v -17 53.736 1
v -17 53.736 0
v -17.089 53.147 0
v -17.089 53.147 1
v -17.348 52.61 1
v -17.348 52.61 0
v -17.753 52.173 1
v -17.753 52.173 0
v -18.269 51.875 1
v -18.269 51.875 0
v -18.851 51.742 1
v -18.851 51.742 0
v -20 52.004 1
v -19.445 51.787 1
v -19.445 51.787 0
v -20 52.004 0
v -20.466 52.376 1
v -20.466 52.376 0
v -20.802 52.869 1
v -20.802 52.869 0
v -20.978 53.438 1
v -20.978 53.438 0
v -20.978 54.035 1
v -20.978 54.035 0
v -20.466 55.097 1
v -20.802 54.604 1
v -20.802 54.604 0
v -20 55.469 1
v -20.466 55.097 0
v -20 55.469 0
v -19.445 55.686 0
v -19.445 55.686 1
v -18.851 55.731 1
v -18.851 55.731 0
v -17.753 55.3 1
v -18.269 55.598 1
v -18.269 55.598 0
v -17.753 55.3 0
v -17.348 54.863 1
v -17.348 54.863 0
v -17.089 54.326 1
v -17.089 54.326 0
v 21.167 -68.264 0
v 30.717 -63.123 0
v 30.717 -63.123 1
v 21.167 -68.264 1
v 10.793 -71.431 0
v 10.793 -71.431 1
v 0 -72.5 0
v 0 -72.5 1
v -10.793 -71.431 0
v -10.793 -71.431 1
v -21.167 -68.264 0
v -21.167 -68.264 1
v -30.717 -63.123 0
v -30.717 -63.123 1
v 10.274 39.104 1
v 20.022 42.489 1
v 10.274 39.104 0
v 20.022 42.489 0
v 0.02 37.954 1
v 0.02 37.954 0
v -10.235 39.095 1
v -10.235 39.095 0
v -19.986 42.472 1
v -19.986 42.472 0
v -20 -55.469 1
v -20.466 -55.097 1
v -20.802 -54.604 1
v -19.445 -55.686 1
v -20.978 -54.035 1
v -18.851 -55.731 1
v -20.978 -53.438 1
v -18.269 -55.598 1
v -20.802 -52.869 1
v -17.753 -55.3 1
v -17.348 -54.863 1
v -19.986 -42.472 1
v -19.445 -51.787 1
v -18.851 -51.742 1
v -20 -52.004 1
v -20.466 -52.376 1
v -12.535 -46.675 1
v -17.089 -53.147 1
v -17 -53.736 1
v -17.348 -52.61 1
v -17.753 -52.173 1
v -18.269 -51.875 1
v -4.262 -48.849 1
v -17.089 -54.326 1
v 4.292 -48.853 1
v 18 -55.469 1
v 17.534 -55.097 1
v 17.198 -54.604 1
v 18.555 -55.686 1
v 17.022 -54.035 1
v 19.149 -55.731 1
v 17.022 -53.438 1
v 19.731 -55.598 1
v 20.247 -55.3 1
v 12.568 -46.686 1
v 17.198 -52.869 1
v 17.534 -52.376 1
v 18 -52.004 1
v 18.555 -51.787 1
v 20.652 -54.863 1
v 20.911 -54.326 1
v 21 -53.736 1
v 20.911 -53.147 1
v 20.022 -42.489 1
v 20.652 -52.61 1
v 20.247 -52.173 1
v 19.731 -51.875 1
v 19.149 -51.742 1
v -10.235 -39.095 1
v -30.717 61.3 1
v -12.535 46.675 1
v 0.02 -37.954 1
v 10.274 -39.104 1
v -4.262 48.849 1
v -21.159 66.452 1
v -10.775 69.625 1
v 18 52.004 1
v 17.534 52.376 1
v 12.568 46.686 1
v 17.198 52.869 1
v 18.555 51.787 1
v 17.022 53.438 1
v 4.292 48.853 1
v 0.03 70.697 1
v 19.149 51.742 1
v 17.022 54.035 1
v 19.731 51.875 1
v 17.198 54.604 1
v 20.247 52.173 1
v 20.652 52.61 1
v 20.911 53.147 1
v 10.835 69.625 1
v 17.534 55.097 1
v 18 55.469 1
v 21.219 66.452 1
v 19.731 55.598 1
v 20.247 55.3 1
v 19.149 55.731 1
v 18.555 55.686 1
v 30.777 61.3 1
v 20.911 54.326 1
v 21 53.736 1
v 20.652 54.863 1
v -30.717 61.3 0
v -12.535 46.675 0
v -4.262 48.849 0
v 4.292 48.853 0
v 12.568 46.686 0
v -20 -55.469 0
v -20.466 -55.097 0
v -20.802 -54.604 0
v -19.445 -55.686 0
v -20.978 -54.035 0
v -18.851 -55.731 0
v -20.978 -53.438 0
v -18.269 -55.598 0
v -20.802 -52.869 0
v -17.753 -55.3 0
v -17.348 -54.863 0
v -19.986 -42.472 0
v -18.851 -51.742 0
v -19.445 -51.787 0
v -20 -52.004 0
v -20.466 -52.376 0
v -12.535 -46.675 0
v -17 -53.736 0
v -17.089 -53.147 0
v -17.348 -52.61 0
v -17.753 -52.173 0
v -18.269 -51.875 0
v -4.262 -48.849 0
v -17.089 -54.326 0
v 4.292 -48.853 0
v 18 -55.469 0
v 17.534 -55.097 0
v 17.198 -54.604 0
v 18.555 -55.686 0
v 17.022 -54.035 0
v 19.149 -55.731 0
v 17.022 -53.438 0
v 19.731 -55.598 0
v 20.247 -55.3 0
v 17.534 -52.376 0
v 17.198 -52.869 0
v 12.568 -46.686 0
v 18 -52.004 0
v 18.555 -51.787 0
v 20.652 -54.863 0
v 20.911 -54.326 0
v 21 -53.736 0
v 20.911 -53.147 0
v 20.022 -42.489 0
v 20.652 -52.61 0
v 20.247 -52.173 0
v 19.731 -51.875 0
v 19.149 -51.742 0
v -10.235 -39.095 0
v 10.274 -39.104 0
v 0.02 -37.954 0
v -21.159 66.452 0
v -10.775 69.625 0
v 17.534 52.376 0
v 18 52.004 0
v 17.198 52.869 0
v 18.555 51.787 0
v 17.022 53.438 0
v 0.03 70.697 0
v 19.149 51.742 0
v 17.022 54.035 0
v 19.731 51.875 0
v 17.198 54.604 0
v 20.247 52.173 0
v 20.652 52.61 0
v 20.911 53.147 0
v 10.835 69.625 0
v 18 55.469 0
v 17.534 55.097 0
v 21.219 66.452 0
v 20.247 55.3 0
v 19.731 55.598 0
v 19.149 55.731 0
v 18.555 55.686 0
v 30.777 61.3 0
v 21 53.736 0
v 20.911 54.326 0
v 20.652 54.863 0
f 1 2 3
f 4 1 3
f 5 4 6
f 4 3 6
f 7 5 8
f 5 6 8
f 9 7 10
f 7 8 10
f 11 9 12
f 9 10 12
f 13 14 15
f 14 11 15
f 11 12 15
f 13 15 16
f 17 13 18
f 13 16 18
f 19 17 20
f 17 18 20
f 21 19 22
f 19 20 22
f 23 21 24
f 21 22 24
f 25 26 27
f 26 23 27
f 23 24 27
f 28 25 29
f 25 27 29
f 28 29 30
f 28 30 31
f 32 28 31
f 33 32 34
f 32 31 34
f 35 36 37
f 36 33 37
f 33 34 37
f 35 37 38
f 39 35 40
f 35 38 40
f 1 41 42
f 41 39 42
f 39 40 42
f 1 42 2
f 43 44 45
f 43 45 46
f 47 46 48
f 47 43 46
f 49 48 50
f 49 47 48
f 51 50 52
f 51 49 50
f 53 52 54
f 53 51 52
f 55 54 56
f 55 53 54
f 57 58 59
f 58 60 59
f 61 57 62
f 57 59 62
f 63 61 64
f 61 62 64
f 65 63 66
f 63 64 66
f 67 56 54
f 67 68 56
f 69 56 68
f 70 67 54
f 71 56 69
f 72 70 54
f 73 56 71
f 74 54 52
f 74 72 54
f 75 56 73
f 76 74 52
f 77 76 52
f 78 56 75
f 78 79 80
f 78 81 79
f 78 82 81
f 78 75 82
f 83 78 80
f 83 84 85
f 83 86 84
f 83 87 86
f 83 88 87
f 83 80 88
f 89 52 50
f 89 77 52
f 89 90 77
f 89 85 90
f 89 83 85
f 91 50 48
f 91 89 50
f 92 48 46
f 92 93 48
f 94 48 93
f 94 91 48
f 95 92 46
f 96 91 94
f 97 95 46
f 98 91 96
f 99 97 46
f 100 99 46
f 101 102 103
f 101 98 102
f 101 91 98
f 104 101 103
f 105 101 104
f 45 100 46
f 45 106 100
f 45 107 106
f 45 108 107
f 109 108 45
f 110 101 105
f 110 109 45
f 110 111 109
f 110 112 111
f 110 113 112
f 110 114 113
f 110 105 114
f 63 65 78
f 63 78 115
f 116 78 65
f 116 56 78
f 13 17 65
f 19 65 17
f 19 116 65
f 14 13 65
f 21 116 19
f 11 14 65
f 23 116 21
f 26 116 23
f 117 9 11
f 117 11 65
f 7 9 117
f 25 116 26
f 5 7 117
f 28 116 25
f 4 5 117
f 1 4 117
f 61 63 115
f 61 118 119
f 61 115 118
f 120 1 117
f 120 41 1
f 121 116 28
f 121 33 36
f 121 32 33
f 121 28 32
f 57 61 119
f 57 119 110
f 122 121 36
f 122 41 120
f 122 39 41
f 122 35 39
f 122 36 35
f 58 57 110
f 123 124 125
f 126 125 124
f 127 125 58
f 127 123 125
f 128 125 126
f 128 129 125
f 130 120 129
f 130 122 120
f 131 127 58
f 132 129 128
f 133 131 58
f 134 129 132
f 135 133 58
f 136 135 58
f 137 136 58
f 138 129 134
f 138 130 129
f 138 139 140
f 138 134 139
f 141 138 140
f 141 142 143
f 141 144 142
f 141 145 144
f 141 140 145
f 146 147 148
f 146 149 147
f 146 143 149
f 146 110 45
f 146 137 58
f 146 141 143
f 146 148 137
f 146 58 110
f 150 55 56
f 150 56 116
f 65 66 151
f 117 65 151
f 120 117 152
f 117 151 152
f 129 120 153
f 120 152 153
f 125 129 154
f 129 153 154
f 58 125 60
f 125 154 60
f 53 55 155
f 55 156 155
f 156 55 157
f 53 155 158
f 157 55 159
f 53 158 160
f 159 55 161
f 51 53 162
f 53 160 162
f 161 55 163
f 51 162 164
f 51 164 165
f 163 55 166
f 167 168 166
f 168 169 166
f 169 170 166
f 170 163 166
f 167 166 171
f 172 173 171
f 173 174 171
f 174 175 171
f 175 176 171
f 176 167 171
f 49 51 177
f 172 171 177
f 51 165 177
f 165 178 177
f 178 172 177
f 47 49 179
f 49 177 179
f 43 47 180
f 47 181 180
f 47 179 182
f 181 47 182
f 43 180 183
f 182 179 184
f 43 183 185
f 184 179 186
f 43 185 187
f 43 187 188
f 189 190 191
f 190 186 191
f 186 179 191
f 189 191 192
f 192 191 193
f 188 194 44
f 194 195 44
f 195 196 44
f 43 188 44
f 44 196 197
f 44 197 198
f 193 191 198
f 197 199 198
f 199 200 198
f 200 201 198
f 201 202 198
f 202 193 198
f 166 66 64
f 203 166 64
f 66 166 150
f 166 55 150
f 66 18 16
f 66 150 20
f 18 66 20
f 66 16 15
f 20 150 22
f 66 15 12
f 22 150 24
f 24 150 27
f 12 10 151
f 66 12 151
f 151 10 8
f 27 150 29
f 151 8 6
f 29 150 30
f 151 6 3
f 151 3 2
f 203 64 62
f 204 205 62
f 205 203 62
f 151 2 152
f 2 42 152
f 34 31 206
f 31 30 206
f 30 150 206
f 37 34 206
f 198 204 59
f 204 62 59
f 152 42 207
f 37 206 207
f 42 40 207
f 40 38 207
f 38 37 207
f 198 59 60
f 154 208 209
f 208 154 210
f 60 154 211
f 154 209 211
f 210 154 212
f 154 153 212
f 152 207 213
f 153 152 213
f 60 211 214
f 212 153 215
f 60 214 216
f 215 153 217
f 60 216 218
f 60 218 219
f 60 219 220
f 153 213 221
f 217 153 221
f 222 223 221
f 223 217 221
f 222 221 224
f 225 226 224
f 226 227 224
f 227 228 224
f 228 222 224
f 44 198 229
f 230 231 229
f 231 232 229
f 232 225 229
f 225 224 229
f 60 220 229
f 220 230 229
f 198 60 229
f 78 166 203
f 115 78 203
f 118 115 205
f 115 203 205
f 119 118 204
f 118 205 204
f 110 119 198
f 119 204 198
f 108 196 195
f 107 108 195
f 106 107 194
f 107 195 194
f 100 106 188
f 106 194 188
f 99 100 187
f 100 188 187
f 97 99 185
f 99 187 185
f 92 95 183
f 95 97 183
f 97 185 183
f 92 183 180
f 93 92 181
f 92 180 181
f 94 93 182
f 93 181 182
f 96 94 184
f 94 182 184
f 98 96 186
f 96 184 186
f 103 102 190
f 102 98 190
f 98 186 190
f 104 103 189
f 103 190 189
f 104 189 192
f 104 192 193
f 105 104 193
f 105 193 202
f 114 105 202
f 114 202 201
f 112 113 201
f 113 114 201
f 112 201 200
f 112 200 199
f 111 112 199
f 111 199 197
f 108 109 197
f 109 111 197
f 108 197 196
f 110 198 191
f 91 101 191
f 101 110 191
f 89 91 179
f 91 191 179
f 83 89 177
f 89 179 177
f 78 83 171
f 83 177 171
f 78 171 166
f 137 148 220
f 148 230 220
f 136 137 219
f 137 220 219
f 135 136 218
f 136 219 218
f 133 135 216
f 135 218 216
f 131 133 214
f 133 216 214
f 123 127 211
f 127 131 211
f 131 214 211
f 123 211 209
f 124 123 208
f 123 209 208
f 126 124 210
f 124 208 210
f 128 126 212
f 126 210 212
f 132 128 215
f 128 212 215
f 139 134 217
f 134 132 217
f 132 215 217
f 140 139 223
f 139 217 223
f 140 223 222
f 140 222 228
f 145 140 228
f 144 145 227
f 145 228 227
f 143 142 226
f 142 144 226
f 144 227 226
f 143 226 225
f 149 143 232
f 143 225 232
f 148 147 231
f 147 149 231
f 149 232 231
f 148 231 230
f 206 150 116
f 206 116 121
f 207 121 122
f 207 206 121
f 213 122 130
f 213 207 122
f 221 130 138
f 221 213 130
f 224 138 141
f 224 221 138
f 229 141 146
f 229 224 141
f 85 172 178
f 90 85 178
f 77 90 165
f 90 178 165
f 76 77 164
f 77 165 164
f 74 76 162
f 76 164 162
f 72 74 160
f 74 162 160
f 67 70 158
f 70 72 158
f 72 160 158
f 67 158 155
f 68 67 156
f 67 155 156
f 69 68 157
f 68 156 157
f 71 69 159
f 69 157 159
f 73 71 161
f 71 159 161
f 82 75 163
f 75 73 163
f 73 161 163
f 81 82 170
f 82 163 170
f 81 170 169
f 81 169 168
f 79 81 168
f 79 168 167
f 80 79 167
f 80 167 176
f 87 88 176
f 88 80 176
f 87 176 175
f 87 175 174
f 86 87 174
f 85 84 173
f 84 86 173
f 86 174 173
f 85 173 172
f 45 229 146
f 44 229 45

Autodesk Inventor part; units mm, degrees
ref_plane "YZ Plane" through (0, 0, 0) normal (1, 0, 0) x (0, 1, 0)
ref_plane "XZ Plane" through (0, 0, 0) normal (0, 1, 0) x (-1, 0, 0)
ref_plane "XY Plane" through (0, 0, 0) normal (0, 0, 1) x (1, 0, 0)
sketch "Szkic1" plane through (0, 0, 0) normal (0, 0, 1) x (1, 0, 0)
  circle A0 centre (-19, 53.736463) radius 2
  line L0 (0, -102.826606) -> (0, 109.459635)
  circle A1 centre (51.489502, -156.180896) radius 2
  circle A2 centre (-19, -53.736463) radius 2
  circle A3 centre (19, -53.736463) radius 2
  spline S0 degree 3 poles (-19.948357, 42.291714) (-7.484612, 36.499399) (6.838806, 36.499399) (19.884685, 42.334177) knots -2 -2 -2 -2 -1 -1 -1 -1
  spline S1 degree 3 poles (19.884685, 42.334177) (18.683547, 43.134298) (16.314211, 44.578944) (13.440795, 46.011363) (10.633281, 47.178527) (8.438356, 47.906787) (5.748573, 48.576507) (3.633449, 48.926153) (1.014806, 49.141741) (-1.070138, 49.1397) (-3.689231, 48.918937) (-5.805048, 48.565032) (-8.496008, 47.889736) (-10.692066, 47.156791) (-13.501106, 45.983476) (-16.376096, 44.544624) (-18.746641, 43.094581) (-19.948357, 42.291714) knots -1.92878405 -1.92878405 -1.92878405 -1.92878405 -1.85742515 -1.78606626 -1.75038681 -1.67902792 -1.64334847 -1.57198957 -1.53631013 -1.46495123 -1.42927178 -1.35791289 -1.32223344 -1.25087454 -1.2151951 -1.1438362 -1.0724773 -1.0724773 -1.0724773 -1.0724773
  spline S2 degree 3 poles (-19.948357, -42.291714) (-7.484612, -36.499399) (6.838806, -36.499399) (19.884685, -42.334177) (19.887771, -42.335557) (19.890857, -42.336938) (19.893943, -42.338318) knots -2 -2 -2 -2 -1 -1 -1 -0.99976344 -0.99976344 -0.99976344 -0.99976344
  arc A4 (10.816477, 63.441394) -> (10.816477, 63.441394) centre (0.029646, 15.697095) ccw
  line L1 (-30.717431, -63.122795) -> (-30.717431, 61.299929)
  line L2 (30.776723, 61.29993) -> (30.717431, -63.122795)
  arc A5 (46.460279, 45.179229) -> (46.388819, 45.291469) centre (0.029646, 15.697095) ccw
  arc A6 (30.776723, 61.29993) -> (-30.717431, 61.299929) centre (0.029646, 15.697095) ccw
  arc A7 (-30.717431, -63.122795) -> (30.717431, -63.122795) centre (0, -17.5) ccw
  spline S3 degree 3 poles (19.884685, -42.334177) (18.683547, -43.134298) (16.314211, -44.578944) (13.440795, -46.011363) (10.633281, -47.178527) (8.438356, -47.906787) (5.748573, -48.576507) (3.633449, -48.926153) (1.014806, -49.141741) (-1.070138, -49.1397) (-3.689231, -48.918937) (-5.805048, -48.565032) (-8.496008, -47.889736) (-10.692066, -47.156791) (-13.501106, -45.983476) (-16.376096, -44.544624) (-18.746641, -43.094581) (-19.948357, -42.291714) knots -1.92878405 -1.92878405 -1.92878405 -1.92878405 -1.85742515 -1.78606626 -1.75038681 -1.67902792 -1.64334847 -1.57198957 -1.53631013 -1.46495123 -1.42927178 -1.35791289 -1.32223344 -1.25087454 -1.2151951 -1.1438362 -1.0724773 -1.0724773 -1.0724773 -1.0724773
  arc A8 (-19.985617, 42.471752) -> (20.021799, 42.489012) centre (0, 84.415359) ccw
  arc A9 (20.021799, 42.489012) -> (-19.985617, 42.471752) centre (0.029646, 15.697095) ccw
  arc A10 (31.190436, 27.800736) -> (30.76126, 28.852355) centre (0.029646, 15.697095) ccw
  line L3 (-47.966946, 0) -> (72.77966, 0)
  arc A11 (20.021799, -42.489012) -> (-19.985617, -42.471752) centre (0, -84.415359) ccw
  arc A12 (-19.985617, -42.471752) -> (20.021799, -42.489012) centre (0.029646, -15.697095) ccw
  line L4 (0, -211.709002) -> (0, 162.987741)
  circle A13 centre (19, 53.736463) radius 2
  point P0 (0, 0)
  point P1 (0.029639, 15.697104)
  dimension "d0" = 4
sketch "Szkic1 outline for Wyciągnięcie proste1" plane through (0, 0, 0) normal (0, 0, 1) x (1, 0, 0)
  line L0 (-30.717431, -63.122795) -> (-30.717431, 61.299929)
  arc A0 (30.717431, -63.122795) -> (-30.717431, -63.122795) centre (0, -17.5) cw
  arc A1 (-30.717431, 61.299929) -> (30.776723, 61.29993) centre (0.029646, 15.697095) cw
  line L1 (30.776723, 61.29993) -> (30.717431, -63.122795)
  circle A2 centre (-19, -53.736463) radius 2
  arc A3 (20.021799, -42.489012) -> (-19.985617, -42.471752) centre (0, -84.415359) ccw
  arc A4 (-19.985617, -42.471752) -> (20.021799, -42.489012) centre (0.029646, -15.697095) ccw
  circle A5 centre (19, -53.736463) radius 2
  circle A6 centre (-19, 53.736463) radius 2
  arc A7 (-19.985617, 42.471752) -> (20.021799, 42.489012) centre (0.029646, 15.697095) cw
  arc A8 (20.021799, 42.489012) -> (-19.985617, 42.471752) centre (0, 84.415359) cw
  circle A9 centre (19, 53.736463) radius 2
extrude "Wyciągnięcie proste1" add sketch "Szkic1 outline for Wyciągnięcie proste1" along normal blind 1
sketch "Szkic2" plane through (0, 0, 1) normal (0, 0, 1) x (1, 0, 0)
  spline S0 degree 3 poles (19.066093, -42.869125) (17.919263, -43.604012) (15.656614, -44.931314) (12.910224, -46.24893) (10.224207, -47.323895) (8.121883, -47.995773) (5.542498, -48.61482) (3.51191, -48.938928) (0.996255, -49.139822) (-1.007288, -49.139431) (-3.523026, -48.937545) (-5.553743, -48.612623) (-8.133347, -47.992513) (-10.235885, -47.319744) (-12.922191, -46.24361) (-15.668883, -44.924773) (-17.931768, -43.596446) (-19.078711, -42.861037) knots 1.08873831 1.08873831 1.08873831 1.08873831 1.15730288 1.22586745 1.26014974 1.32871431 1.36299659 1.43156116 1.46584345 1.53440802 1.5686903 1.63725487 1.67153715 1.74010172 1.77438401 1.84294858 1.91151315 1.91151315 1.91151315 1.91151315
  spline S1 degree 2 poles (-19.078711, -42.861037) (-0.031622, -36.330707) (19.066093, -42.869125) knots 1.17954056 1.17954056 1.17954056 1.82085643 1.82085643 1.82085643
  point P0 (0, 0)
extrude "Wyciągnięcie proste2" cut sketch "Szkic2" against normal through all
properties part number "plyta_odbiornik"
